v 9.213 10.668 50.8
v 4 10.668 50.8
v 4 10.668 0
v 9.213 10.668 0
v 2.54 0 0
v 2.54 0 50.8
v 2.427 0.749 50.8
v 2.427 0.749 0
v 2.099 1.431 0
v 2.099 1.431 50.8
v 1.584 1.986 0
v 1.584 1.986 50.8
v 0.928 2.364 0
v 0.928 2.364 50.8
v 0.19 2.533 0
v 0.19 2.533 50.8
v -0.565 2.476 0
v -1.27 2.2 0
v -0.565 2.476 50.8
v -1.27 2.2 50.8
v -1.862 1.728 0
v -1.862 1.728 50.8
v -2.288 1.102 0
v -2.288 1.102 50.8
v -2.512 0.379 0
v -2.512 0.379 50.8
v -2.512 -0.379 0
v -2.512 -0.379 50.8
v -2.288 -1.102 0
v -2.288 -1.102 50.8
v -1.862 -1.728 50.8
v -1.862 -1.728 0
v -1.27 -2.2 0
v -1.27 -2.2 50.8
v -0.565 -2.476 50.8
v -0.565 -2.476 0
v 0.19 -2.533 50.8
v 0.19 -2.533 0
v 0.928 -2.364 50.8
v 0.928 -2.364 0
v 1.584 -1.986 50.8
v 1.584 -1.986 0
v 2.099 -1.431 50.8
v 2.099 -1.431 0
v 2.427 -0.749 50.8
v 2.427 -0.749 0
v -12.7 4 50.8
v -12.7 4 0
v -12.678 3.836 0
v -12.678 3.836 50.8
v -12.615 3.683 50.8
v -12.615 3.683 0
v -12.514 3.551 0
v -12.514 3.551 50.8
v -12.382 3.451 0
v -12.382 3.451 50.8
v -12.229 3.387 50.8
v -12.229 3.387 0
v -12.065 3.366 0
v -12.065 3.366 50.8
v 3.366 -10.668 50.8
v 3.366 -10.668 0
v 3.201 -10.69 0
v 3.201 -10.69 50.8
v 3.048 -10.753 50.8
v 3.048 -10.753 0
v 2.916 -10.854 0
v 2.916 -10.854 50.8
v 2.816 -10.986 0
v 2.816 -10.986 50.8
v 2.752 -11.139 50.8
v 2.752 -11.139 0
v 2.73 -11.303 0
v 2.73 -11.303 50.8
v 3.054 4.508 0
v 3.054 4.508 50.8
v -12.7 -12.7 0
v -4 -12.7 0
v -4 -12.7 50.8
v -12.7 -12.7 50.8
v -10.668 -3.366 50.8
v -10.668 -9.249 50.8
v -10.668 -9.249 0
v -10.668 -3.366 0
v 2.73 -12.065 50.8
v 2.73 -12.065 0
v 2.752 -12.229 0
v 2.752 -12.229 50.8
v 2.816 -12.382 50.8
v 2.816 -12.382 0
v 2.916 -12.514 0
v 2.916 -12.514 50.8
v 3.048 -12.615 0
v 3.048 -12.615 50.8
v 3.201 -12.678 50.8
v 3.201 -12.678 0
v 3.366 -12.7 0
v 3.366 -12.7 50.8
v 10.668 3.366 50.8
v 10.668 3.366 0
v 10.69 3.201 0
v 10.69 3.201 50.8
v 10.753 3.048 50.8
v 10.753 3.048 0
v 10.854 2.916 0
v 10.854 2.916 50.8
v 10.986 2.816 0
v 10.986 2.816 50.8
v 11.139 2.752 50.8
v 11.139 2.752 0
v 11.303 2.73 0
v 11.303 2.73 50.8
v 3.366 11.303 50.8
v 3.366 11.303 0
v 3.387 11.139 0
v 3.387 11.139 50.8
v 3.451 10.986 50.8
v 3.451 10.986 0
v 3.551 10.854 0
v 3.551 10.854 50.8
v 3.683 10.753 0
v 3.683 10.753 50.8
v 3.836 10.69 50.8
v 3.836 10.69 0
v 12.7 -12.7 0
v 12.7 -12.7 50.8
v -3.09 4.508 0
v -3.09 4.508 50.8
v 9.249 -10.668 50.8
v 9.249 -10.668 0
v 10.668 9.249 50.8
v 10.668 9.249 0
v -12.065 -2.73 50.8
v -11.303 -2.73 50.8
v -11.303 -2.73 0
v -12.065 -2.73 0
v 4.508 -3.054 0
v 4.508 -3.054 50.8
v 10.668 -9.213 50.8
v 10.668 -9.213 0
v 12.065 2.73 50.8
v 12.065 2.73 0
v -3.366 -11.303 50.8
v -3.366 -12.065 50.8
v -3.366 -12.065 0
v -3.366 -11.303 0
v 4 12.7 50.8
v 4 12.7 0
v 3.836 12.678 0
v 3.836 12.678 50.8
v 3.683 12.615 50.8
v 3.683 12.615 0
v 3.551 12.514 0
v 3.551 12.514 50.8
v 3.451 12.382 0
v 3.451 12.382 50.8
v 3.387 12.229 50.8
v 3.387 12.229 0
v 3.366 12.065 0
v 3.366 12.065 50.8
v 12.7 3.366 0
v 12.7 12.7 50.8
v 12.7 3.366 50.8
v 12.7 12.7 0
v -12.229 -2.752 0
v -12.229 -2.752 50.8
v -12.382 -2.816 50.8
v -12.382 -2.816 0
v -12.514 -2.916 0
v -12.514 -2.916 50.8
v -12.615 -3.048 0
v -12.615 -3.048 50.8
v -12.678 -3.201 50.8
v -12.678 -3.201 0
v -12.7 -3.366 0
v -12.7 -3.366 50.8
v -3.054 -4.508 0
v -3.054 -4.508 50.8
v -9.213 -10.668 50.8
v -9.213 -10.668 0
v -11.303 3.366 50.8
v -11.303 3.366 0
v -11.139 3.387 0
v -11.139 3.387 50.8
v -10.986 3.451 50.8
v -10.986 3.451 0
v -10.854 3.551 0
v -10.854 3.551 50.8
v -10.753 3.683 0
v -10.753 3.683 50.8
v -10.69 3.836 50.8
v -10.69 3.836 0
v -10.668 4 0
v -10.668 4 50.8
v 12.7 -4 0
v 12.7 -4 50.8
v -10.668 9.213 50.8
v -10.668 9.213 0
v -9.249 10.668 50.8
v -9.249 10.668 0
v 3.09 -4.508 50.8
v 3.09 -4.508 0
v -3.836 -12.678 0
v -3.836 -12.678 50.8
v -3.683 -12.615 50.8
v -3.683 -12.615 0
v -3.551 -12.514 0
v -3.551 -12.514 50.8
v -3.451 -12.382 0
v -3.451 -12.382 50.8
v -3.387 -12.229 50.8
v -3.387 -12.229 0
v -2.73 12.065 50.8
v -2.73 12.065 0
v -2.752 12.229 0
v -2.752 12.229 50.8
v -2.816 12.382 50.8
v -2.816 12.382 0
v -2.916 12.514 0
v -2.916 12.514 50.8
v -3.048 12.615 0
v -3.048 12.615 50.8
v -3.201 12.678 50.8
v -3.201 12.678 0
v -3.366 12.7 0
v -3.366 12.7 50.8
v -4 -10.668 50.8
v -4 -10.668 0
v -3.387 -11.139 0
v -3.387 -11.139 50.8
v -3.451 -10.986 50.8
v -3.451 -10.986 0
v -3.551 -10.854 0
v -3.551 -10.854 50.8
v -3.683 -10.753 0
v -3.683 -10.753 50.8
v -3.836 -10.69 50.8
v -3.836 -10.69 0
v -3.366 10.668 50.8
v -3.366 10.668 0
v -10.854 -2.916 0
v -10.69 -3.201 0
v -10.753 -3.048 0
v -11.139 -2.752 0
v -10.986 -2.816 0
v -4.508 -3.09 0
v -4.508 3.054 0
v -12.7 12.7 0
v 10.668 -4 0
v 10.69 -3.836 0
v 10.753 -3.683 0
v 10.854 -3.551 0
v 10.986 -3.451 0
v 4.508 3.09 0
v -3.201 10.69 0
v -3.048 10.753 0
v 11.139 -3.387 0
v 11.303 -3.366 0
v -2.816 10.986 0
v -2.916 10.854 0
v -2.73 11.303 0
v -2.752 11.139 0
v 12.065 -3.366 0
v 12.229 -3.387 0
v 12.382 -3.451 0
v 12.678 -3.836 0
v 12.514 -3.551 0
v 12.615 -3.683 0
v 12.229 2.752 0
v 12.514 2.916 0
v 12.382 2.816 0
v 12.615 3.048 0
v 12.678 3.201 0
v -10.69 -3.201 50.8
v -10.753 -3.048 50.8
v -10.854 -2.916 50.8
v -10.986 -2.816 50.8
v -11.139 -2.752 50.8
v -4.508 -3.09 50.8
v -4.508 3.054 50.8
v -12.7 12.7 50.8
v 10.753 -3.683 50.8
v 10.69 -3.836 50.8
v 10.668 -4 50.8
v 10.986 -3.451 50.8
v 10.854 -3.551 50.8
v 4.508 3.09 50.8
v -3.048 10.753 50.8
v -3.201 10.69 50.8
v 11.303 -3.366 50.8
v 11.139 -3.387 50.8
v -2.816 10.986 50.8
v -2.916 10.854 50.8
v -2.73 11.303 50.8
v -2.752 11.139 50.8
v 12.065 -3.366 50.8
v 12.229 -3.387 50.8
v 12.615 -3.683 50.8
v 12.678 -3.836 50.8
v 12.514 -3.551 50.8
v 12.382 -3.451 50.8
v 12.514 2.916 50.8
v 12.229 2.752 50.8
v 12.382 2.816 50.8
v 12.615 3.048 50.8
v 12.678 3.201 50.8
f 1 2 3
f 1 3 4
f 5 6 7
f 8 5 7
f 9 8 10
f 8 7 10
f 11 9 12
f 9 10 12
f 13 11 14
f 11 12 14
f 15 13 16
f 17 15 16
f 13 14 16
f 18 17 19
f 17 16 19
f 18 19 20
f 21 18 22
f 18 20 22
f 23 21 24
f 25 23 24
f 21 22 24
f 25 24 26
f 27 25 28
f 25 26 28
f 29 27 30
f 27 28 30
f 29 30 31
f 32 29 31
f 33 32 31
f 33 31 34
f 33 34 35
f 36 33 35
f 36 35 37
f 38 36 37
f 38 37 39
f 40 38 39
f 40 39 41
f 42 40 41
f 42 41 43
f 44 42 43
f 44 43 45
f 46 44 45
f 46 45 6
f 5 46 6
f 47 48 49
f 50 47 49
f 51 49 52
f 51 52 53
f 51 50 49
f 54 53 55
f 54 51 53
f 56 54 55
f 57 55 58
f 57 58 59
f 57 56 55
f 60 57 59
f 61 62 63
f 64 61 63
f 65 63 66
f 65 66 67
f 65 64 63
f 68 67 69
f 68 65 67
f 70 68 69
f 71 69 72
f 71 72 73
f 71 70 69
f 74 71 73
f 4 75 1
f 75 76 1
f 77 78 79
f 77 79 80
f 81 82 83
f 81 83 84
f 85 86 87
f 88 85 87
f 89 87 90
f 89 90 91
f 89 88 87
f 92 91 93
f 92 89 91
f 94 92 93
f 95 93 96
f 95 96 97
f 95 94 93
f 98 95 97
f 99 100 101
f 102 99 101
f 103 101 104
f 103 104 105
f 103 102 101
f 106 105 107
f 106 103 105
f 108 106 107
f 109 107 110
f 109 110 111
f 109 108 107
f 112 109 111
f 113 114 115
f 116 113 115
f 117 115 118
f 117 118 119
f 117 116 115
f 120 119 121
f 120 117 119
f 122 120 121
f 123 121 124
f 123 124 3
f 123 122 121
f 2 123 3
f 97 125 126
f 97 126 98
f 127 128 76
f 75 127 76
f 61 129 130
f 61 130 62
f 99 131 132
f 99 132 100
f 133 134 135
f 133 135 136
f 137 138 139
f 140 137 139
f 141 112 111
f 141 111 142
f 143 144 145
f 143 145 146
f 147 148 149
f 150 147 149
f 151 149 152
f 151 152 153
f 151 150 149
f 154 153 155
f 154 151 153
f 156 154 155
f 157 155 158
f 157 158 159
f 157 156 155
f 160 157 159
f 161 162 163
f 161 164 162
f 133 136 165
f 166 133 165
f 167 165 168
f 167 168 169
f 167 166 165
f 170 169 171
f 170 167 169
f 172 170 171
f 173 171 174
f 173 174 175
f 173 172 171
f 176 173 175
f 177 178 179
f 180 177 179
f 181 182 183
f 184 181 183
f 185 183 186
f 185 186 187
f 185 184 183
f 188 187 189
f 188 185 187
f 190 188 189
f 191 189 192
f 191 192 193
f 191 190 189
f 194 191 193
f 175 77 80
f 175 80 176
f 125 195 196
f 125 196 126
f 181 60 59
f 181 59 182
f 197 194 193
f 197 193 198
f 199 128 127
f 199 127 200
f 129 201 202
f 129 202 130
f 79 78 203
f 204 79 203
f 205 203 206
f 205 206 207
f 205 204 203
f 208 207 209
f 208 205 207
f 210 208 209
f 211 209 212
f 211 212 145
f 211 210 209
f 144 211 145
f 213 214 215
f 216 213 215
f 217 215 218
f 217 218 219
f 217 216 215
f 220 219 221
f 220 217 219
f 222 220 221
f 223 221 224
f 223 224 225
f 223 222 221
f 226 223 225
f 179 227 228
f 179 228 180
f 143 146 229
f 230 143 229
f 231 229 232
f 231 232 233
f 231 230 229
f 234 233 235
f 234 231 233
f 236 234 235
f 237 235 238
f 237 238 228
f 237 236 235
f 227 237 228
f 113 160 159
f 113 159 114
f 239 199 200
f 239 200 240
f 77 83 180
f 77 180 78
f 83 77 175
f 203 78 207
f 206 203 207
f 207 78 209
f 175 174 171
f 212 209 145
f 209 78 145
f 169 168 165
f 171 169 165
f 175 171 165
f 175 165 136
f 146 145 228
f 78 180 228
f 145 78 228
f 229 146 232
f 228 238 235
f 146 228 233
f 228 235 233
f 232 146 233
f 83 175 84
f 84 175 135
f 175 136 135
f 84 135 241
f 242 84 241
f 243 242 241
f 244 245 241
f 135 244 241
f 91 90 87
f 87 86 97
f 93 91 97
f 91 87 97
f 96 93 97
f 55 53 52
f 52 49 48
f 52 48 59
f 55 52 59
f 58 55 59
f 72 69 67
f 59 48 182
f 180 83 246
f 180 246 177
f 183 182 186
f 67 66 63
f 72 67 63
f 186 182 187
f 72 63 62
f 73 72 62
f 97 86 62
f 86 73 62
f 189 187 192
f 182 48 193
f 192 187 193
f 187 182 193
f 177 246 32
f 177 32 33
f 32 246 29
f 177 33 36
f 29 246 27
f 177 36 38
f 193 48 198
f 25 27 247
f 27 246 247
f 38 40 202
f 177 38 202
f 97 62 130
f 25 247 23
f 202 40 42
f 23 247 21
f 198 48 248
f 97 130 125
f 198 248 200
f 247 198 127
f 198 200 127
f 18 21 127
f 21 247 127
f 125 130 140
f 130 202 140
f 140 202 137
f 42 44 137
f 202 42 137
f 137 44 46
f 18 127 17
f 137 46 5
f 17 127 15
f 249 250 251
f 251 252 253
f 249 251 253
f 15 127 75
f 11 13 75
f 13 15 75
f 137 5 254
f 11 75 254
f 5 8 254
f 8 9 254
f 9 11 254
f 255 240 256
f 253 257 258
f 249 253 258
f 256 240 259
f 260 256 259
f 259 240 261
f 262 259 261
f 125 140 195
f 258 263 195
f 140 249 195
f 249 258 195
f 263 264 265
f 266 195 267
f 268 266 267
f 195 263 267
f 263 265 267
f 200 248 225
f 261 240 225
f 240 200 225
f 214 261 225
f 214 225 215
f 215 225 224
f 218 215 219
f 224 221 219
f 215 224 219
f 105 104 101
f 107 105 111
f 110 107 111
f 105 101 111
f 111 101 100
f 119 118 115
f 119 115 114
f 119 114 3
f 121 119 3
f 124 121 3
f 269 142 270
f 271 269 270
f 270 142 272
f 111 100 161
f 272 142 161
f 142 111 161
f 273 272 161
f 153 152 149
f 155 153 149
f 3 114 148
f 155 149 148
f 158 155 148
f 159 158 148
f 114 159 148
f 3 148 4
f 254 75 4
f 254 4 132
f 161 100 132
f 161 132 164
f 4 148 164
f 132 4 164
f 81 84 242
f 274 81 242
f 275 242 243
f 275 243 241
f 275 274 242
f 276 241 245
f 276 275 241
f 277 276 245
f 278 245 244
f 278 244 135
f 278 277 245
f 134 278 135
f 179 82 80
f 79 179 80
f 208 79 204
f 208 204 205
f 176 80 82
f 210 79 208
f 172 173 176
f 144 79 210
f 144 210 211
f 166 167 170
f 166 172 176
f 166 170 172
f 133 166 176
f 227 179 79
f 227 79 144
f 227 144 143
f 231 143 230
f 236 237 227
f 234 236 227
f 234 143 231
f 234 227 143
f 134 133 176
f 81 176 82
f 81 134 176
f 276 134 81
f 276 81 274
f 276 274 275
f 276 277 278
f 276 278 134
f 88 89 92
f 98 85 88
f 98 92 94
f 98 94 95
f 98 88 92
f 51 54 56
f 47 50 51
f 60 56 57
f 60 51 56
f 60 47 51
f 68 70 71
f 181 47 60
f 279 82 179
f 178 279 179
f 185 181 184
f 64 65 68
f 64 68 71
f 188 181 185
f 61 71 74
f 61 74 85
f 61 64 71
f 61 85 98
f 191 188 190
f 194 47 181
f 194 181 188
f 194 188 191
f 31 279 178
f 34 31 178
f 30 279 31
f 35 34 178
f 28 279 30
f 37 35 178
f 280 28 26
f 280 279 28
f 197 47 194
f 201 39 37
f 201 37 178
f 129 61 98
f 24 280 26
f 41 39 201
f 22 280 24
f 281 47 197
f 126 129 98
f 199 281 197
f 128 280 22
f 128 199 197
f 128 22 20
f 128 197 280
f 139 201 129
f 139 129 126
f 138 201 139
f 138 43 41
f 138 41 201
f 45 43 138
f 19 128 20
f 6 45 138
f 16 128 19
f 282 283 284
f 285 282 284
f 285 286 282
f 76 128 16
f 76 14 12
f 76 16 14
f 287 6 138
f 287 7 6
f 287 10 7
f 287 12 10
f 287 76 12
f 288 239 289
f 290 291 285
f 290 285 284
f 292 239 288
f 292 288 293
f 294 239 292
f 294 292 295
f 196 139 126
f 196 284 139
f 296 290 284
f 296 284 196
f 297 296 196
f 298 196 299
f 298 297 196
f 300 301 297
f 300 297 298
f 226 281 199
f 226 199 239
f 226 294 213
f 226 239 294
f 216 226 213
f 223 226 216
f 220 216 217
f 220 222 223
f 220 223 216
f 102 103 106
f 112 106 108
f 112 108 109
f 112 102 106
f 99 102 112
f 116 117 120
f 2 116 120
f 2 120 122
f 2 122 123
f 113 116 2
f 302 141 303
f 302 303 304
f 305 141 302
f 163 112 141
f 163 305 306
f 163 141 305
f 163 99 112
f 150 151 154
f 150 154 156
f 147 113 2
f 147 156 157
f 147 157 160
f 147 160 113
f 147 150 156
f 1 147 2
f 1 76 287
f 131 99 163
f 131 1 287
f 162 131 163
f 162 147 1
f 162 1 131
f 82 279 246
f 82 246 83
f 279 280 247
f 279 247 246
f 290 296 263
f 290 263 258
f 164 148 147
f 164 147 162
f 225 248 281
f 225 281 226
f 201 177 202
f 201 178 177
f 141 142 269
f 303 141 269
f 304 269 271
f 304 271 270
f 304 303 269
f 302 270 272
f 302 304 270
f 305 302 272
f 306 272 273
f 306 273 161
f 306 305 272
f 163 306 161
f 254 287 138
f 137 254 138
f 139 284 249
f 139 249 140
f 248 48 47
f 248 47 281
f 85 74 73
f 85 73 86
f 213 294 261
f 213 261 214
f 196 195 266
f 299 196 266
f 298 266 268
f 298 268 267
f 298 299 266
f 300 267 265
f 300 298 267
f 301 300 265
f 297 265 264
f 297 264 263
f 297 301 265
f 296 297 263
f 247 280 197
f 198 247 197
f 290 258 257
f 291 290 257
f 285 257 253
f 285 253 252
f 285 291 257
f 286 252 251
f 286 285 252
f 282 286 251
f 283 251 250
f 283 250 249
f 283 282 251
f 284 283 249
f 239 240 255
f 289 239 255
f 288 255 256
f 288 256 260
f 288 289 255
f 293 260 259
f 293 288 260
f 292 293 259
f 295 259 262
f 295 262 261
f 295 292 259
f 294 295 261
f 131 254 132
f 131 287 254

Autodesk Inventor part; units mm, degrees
ref_plane "YZ Plane" through (0, 0, 0) normal (1, 0, 0) x (0, 1, 0)
ref_plane "XZ Plane" through (0, 0, 0) normal (0, 1, 0) x (-1, 0, 0)
ref_plane "XY Plane" through (0, 0, 0) normal (0, 0, 1) x (1, 0, 0)
sketch "Sketch1" plane through (0, 0, 0) normal (0, 0, 1) x (1, 0, 0)
  line L0 (-12.7, 12.7) -> (12.7, 12.7)
  line L1 (12.7, 12.7) -> (12.7, -12.7)
  line L2 (12.7, -12.7) -> (-12.7, -12.7)
  line L3 (-12.7, -12.7) -> (-12.7, 12.7)
  point P0 (0, 0)
  dimension "d0" = 25.4
  dimension "d1" = 25.4
  dimension "d2" = 12.7
  dimension "d3" = 12.7
extrude "Extrusion1" add sketch "Sketch1" along normal blind 50.8
sketch "Sketch2" plane through (0, 0, 50.8) normal (0, 0, 1) x (1, 0, 0)
  circle A0 centre (0, 0) radius 2.54
  line L0 (-4.5085, 4.5085) -> (4.5085, 4.5085)
  line L1 (-4.5085, -4.5085) -> (4.5085, -4.5085)
  line L2 (4.5085, 4.5085) -> (4.5085, -4.5085)
  line L3 (-4.5085, 4.5085) -> (-4.5085, -4.5085)
  line L4 (-3.0896, 4.5085) -> (-11.2811, 12.7)
  line L5 (-4.5085, 3.0537) -> (-12.7, 11.2452)
  line L6 (12.7, 12.7) -> (-12.7, 12.7) projected
  line L7 (-12.7, 12.7) -> (-12.7, 4.0005)
  line L8 (-10.668, 4.0005) -> (-10.668, 9.2132)
  line L9 (-9.2491, 10.668) -> (-3.3655, 10.668)
  line L10 (-12.7, 12.7) -> (-3.3655, 12.7)
  line L11 (-2.7305, 11.303) -> (-2.7305, 12.065)
  line L12 (-12.065, 3.3655) -> (-11.303, 3.3655)
  arc A1 (-12.7, 4.0005) -> (-12.065, 3.3655) centre (-12.065, 4.0005) ccw
  arc A2 (-11.303, 3.3655) -> (-10.668, 4.0005) centre (-11.303, 4.0005) ccw
  arc A3 (-3.3655, 10.668) -> (-2.7305, 11.303) centre (-3.3655, 11.303) ccw
  arc A4 (-2.7305, 12.065) -> (-3.3655, 12.7) centre (-3.3655, 12.065) ccw
  arc A5 (-3.3655, -11.303) -> (-4.0005, -10.668) centre (-4.0005, -11.303) ccw
  line L13 (-3.3655, -12.065) -> (-3.3655, -11.303)
  arc A6 (-4.0005, -12.7) -> (-3.3655, -12.065) centre (-4.0005, -12.065) ccw
  line L14 (-3.0537, -4.5085) -> (-11.2452, -12.7)
  line L15 (-10.668, -9.2491) -> (-10.668, -3.3655)
  line L16 (-4.5085, -3.0896) -> (-12.7, -11.2811)
  line L17 (-12.7, -12.7) -> (-12.7, -3.3655)
  arc A7 (-10.668, -3.3655) -> (-11.303, -2.7305) centre (-11.303, -3.3655) ccw
  line L18 (-11.303, -2.7305) -> (-12.065, -2.7305)
  arc A8 (-12.065, -2.7305) -> (-12.7, -3.3655) centre (-12.065, -3.3655) ccw
  line L19 (-4.0005, -10.668) -> (-9.2132, -10.668)
  line L20 (-12.7, -12.7) -> (-4.0005, -12.7)
  arc A9 (11.303, -3.3655) -> (10.668, -4.0005) centre (11.303, -4.0005) ccw
  line L21 (12.065, -3.3655) -> (11.303, -3.3655)
  arc A10 (12.7, -4.0005) -> (12.065, -3.3655) centre (12.065, -4.0005) ccw
  line L22 (4.5085, -3.0537) -> (12.7, -11.2452)
  line L23 (9.2491, -10.668) -> (3.3655, -10.668)
  line L24 (3.0896, -4.5085) -> (11.2811, -12.7)
  line L25 (12.7, -12.7) -> (3.3655, -12.7)
  arc A11 (3.3655, -10.668) -> (2.7305, -11.303) centre (3.3655, -11.303) ccw
  line L26 (2.7305, -11.303) -> (2.7305, -12.065)
  arc A12 (2.7305, -12.065) -> (3.3655, -12.7) centre (3.3655, -12.065) ccw
  line L27 (10.668, -4.0005) -> (10.668, -9.2132)
  line L28 (12.7, -12.7) -> (12.7, -4.0005)
  arc A13 (3.3655, 11.303) -> (4.0005, 10.668) centre (4.0005, 11.303) ccw
  line L29 (3.3655, 12.065) -> (3.3655, 11.303)
  arc A14 (4.0005, 12.7) -> (3.3655, 12.065) centre (4.0005, 12.065) ccw
  line L30 (3.0537, 4.5085) -> (11.2452, 12.7)
  line L31 (10.668, 9.2491) -> (10.668, 3.3655)
  line L32 (4.5085, 3.0896) -> (12.7, 11.2811)
  line L33 (12.7, 12.7) -> (12.7, 3.3655)
  arc A15 (10.668, 3.3655) -> (11.303, 2.7305) centre (11.303, 3.3655) ccw
  line L34 (11.303, 2.7305) -> (12.065, 2.7305)
  arc A16 (12.065, 2.7305) -> (12.7, 3.3655) centre (12.065, 3.3655) ccw
  line L35 (4.0005, 10.668) -> (9.2132, 10.668)
  line L36 (12.7, 12.7) -> (4.0005, 12.7)
  line L37 (-4.5085, 3.0537) -> (-4.5085, 4.5085)
  line L38 (-3.0896, 4.5085) -> (-4.5085, 4.5085)
  line L39 (-12.7, -12.7) -> (-4.0005, -12.7)
  line L40 (-4.0005, -10.668) -> (-9.2132, -10.668)
  line L41 (-10.668, -9.2491) -> (-10.668, -3.3655)
  line L42 (-12.7, -12.7) -> (-12.7, -3.3655)
  line L43 (-11.303, -2.7305) -> (-12.065, -2.7305)
  arc A17 (-10.668, -3.3655) -> (-11.303, -2.7305) centre (-11.303, -3.3655) ccw
  arc A18 (-12.065, -2.7305) -> (-12.7, -3.3655) centre (-12.065, -3.3655) ccw
  line L44 (-4.5085, -3.0896) -> (-4.5085, -4.5085)
  line L45 (-4.5085, -3.0896) -> (-12.7, -11.2811)
  line L46 (-3.0537, -4.5085) -> (-4.5085, -4.5085)
  line L47 (-3.0537, -4.5085) -> (-11.2452, -12.7)
  line L48 (-4.5085, -4.5085) -> (-4.5085, 4.5085)
  circle A19 centre (0, 0) radius 2.54
  line L49 (-4.5085, -4.5085) -> (4.5085, -4.5085)
  line L50 (-3.3655, -12.065) -> (-3.3655, -11.303)
  arc A20 (-4.0005, -12.7) -> (-3.3655, -12.065) centre (-4.0005, -12.065) ccw
  arc A21 (-3.3655, -11.303) -> (-4.0005, -10.668) centre (-4.0005, -11.303) ccw
  line L51 (12.7, -12.7) -> (12.7, -4.0005)
  line L52 (10.668, -4.0005) -> (10.668, -9.2132)
  line L53 (9.2491, -10.668) -> (3.3655, -10.668)
  line L54 (12.7, -12.7) -> (3.3655, -12.7)
  line L55 (2.7305, -11.303) -> (2.7305, -12.065)
  arc A22 (3.3655, -10.668) -> (2.7305, -11.303) centre (3.3655, -11.303) ccw
  arc A23 (2.7305, -12.065) -> (3.3655, -12.7) centre (3.3655, -12.065) ccw
  line L56 (3.0896, -4.5085) -> (4.5085, -4.5085)
  line L57 (3.0896, -4.5085) -> (11.2811, -12.7)
  line L58 (4.5085, -3.0537) -> (4.5085, -4.5085)
  line L59 (4.5085, -3.0537) -> (12.7, -11.2452)
  line L60 (4.5085, -4.5085) -> (-4.5085, -4.5085)
  circle A24 centre (0, 0) radius 2.54
  line L61 (4.5085, -4.5085) -> (4.5085, 4.5085)
  line L62 (12.065, -3.3655) -> (11.303, -3.3655)
  arc A25 (12.7, -4.0005) -> (12.065, -3.3655) centre (12.065, -4.0005) ccw
  arc A26 (11.303, -3.3655) -> (10.668, -4.0005) centre (11.303, -4.0005) ccw
  line L63 (12.7, 12.7) -> (4.0005, 12.7)
  line L64 (4.0005, 10.668) -> (9.2132, 10.668)
  line L65 (10.668, 9.2491) -> (10.668, 3.3655)
  line L66 (12.7, 12.7) -> (12.7, 3.3655)
  line L67 (11.303, 2.7305) -> (12.065, 2.7305)
  arc A27 (10.668, 3.3655) -> (11.303, 2.7305) centre (11.303, 3.3655) ccw
  arc A28 (12.065, 2.7305) -> (12.7, 3.3655) centre (12.065, 3.3655) ccw
  line L68 (4.5085, 3.0896) -> (4.5085, 4.5085)
  line L69 (4.5085, 3.0896) -> (12.7, 11.2811)
  line L70 (3.0537, 4.5085) -> (4.5085, 4.5085)
  line L71 (3.0537, 4.5085) -> (11.2452, 12.7)
  line L72 (4.5085, 4.5085) -> (4.5085, -4.5085)
  circle A29 centre (0, 0) radius 2.54
  line L73 (4.5085, 4.5085) -> (-4.5085, 4.5085)
  line L74 (3.3655, 12.065) -> (3.3655, 11.303)
  arc A30 (4.0005, 12.7) -> (3.3655, 12.065) centre (4.0005, 12.065) ccw
  arc A31 (3.3655, 11.303) -> (4.0005, 10.668) centre (4.0005, 11.303) ccw
  point P0 (-12.7, 3.3655)
  point P1 (-2.7305, 12.7)
  point P2 (-3.3655, -12.7)
  point P3 (-12.7, -2.7305)
  point P4 (12.7, -3.3655)
  point P5 (2.7305, -12.7)
  point P6 (3.3655, 12.7)
  point P7 (12.7, 2.7305)
  point P8 (-3.3655, -12.7)
  point P9 (-12.7, -2.7305)
  point P10 (12.7, -3.3655)
  point P11 (2.7305, -12.7)
  point P12 (3.3655, 12.7)
  point P13 (12.7, 2.7305)
  dimension "d6" = 5.08
  dimension "d7" = 9.017
  dimension "d8" = 4.5085
  dimension "d9" = 4.5085
  dimension "d10" = 4.5085
  dimension "d11" = 2.032
  dimension "d12" = 1.0033
  dimension "d13" = 135
  dimension "d17" = 9.3345
  dimension "d19" = 2.032
  dimension "d20" = 2.032
  dimension "d21" = 0.635
  dimension "d22" = 9.3345
  dimension "d25" = 360
  dimension "d29" = 360
extrude "Extrusion2" cut sketch "Sketch2" against normal up to surface (50.8 mm away) contours L3 L5 L7 L6 L4 L0 | L0 L2 L1 L3 | L30 L6 L33 L32 L2 L0 | L4 L6 A4 L11 A3 L9 | L3 L1 L14 L20 L17 L16 | L8 A2 L12 A1 L7 L5 | L35 A13 L29 A14 L6 L30 | L16 L17 A8 L18 A7 L15 | L22 L28 L25 L24 L1 L2 | L32 L33 A16 L34 A15 L31 | L19 A5 L13 A6 L20 L14 | L27 A9 L21 A10 L28 L22 | L24 L25 A12 L26 A11 L23 keep common part
equation "\"d22\" = d17"
properties part number "~2 in 80-20 extrusion"
